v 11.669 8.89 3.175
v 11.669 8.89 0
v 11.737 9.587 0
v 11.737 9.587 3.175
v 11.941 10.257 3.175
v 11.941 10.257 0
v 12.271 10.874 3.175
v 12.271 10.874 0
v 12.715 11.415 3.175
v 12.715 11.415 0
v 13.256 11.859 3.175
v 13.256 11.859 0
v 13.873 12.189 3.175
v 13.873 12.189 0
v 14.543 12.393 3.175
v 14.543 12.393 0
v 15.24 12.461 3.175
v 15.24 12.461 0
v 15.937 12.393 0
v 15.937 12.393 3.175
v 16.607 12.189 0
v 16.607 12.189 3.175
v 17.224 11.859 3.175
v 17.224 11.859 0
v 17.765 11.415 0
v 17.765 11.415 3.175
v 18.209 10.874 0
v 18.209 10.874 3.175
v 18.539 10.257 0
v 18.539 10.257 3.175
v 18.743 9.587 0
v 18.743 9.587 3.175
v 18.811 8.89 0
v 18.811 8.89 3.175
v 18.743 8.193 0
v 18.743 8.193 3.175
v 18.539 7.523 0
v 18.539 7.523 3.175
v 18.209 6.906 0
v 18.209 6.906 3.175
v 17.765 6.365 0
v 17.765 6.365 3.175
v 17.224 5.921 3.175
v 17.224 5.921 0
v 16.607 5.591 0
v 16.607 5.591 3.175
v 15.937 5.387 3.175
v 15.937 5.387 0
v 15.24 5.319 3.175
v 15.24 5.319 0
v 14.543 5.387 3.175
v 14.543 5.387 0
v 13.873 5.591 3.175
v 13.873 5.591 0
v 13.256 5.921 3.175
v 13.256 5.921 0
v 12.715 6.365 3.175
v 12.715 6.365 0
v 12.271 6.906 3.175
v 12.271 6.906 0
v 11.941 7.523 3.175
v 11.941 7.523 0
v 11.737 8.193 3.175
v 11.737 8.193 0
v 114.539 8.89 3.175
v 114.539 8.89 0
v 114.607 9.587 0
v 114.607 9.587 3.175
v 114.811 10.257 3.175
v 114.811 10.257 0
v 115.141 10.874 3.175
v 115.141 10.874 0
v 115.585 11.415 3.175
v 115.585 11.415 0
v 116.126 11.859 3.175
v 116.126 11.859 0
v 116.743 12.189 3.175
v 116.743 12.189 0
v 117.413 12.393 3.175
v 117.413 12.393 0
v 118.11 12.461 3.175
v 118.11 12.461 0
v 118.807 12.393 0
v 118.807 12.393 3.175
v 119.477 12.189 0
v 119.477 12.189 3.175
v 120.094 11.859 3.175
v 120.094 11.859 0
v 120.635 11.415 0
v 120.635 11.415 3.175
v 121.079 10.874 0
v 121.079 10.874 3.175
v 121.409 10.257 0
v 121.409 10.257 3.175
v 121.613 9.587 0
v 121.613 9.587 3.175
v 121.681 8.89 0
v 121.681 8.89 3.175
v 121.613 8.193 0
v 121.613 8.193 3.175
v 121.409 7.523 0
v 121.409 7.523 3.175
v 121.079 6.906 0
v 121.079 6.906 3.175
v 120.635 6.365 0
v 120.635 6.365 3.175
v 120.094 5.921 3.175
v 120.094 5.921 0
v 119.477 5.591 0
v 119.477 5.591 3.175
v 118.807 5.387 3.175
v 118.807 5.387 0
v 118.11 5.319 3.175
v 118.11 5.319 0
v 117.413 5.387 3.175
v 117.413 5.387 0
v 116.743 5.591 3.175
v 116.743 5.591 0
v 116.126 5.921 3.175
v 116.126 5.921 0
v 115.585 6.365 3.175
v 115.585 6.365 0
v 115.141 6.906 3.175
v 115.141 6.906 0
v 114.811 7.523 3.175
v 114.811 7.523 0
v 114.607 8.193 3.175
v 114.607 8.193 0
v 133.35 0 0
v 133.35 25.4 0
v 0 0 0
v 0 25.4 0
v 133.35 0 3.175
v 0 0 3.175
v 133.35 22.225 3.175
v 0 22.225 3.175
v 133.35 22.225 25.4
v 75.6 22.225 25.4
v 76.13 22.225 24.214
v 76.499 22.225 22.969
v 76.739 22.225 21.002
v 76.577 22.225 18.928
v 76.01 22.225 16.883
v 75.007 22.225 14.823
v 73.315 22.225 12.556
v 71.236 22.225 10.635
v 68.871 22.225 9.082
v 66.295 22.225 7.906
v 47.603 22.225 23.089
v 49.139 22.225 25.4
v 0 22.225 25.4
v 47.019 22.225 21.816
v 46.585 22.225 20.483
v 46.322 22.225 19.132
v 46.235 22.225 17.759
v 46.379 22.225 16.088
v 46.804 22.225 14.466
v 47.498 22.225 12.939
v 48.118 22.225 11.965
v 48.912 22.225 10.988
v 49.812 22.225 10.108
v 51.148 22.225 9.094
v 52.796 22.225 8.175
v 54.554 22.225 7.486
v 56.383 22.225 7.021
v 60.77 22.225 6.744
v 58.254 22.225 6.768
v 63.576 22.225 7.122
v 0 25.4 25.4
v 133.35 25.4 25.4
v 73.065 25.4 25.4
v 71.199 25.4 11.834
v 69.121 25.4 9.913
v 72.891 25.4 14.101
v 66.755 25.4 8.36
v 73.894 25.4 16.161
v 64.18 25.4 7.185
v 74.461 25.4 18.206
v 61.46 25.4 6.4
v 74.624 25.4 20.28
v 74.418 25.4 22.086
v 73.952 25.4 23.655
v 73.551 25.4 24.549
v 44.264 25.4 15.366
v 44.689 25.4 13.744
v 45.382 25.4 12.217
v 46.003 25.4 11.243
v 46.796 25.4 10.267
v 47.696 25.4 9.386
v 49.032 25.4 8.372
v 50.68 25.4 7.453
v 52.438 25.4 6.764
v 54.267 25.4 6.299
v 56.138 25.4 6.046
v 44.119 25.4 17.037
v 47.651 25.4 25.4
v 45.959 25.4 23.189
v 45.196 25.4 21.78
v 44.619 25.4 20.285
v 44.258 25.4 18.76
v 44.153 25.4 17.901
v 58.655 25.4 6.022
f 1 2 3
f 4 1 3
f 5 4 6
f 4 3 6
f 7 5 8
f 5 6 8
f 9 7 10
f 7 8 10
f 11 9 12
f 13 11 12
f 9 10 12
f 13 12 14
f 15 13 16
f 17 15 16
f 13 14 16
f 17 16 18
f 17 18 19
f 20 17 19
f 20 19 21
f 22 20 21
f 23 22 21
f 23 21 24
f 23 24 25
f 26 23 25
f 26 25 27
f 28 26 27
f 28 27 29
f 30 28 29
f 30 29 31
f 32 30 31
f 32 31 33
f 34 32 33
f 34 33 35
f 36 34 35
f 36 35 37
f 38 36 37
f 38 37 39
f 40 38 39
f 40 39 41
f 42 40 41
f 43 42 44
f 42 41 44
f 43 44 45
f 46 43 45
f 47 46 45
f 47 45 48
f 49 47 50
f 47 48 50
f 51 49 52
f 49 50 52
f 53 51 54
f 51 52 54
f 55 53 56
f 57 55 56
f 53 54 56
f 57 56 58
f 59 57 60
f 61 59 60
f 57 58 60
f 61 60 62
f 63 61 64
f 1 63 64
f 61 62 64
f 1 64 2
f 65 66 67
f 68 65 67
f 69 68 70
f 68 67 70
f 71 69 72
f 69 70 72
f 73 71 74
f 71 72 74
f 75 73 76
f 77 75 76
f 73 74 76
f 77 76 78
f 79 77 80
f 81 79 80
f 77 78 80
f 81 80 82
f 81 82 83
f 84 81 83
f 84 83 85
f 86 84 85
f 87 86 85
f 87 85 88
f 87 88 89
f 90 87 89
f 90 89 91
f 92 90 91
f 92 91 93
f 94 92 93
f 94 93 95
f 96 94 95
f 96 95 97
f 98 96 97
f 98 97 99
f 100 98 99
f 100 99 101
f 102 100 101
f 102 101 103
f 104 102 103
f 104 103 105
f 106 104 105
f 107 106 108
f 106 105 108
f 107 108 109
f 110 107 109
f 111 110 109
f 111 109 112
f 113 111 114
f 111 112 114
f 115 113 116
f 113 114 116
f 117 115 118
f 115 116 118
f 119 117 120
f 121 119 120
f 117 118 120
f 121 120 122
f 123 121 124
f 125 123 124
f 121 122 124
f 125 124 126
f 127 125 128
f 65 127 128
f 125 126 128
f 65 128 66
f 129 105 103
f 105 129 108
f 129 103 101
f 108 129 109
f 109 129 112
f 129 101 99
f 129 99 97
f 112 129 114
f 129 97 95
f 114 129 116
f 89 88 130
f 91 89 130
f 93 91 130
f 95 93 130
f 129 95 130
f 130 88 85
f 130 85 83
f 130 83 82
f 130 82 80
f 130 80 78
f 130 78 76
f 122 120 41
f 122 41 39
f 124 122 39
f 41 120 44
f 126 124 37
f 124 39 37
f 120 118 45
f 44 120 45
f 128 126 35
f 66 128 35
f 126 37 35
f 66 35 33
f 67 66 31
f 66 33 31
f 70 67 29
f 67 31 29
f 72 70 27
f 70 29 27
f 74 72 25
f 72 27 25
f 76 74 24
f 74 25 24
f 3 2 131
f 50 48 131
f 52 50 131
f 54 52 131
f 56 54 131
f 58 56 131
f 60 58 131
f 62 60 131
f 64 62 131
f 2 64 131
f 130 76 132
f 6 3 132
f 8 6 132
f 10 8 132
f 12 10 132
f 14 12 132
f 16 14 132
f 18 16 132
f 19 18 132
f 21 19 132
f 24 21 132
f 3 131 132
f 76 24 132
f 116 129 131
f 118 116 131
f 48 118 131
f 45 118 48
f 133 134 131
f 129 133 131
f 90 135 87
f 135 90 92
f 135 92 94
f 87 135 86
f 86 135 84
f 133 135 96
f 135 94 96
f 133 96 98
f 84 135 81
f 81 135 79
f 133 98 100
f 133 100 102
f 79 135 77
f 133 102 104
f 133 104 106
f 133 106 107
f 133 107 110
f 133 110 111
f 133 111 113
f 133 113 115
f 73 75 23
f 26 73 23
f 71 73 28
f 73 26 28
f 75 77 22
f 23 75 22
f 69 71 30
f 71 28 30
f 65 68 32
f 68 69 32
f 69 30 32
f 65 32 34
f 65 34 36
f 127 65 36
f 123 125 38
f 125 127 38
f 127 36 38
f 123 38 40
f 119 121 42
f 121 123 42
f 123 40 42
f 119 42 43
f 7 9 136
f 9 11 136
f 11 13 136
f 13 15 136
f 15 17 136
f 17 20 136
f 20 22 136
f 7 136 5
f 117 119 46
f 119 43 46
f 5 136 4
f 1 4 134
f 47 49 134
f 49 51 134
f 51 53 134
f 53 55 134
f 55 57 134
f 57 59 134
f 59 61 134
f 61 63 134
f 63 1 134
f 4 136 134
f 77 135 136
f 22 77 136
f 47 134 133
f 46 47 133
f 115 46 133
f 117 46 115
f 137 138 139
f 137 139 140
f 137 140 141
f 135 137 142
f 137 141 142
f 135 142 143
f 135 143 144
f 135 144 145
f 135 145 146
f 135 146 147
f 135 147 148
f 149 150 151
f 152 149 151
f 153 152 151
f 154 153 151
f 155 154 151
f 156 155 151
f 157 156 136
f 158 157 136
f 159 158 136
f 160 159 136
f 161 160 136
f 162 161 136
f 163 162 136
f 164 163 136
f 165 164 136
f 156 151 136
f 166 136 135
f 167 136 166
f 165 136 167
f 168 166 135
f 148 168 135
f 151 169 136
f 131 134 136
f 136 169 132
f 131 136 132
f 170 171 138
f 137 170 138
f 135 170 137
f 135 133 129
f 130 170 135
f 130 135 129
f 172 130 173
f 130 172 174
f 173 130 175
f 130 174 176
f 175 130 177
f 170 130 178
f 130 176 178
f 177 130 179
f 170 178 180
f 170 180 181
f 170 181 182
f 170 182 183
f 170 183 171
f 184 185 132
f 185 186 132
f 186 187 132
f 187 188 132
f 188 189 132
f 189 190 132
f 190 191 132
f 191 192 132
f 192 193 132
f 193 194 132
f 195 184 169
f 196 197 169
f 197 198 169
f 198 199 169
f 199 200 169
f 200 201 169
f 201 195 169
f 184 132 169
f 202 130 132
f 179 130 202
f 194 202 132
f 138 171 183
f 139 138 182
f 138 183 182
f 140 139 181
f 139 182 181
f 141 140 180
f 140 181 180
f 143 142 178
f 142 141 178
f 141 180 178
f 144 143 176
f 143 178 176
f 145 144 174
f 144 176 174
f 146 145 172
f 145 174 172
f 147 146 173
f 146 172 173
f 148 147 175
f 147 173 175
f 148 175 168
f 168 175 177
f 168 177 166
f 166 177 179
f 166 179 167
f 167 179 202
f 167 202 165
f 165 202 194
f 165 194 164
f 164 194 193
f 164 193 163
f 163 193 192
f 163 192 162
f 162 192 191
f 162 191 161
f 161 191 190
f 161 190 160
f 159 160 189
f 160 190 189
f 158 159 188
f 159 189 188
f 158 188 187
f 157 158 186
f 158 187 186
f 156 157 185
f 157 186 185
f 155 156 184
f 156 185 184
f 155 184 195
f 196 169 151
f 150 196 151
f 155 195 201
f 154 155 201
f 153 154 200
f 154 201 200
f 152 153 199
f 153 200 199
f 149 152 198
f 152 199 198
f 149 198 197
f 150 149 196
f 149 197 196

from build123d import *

# Parameters (mm, degrees)
BOSS_EXTRUDE1_DEPTH = 133.35
SKETCH5_R           = 3.57124
CUT_EXTRUDE1_DEPTH  = 139.103376269


with BuildPart() as part:
    # Sketch1 → Boss-Extrude1 (new body)
    with BuildSketch(Plane(origin=(0, 0, 0), x_dir=(0, 0, -1), z_dir=(1, 0, 0))):
        Polygon((0, 0), (0, 25.4), (-25.4, 25.4), (-25.4, 22.225), (-3.175, 22.225), (-3.175, 0), align=None)
    extrude(amount=BOSS_EXTRUDE1_DEPTH)

    # Cut-Sweep1: read off the stored shape, not the designer's step
    # Cut-Sweep1: loft between two sections, ruled curve by curve
    cut_sweep1_from = [
        Edge.make_bspline([(317.515141944, -384.873460742, 110.314894304), (318.529967826, -386.50832307, 135.641902686), (340.110332702, -373.112508356, 135.641902686), (339.095506819, -371.477646028, 110.314894304), (338.080680937, -369.8427837, 84.987885922), (316.500316061, -383.238598413, 84.987885922), (317.515141944, -384.873460742, 110.314894304)], [0, 0, 0, 0, 0.5, 0.5, 0.5, 1, 1, 1, 1], 3, [1, 0.333333333, 0.333333333, 1, 0.333333333, 0.333333333, 1]),
    ]
    cut_sweep1_to = [
        Edge.make_bspline([(-268.15000351, 494.008408115, -89.503953221), (-267.135177627, 492.373545787, -64.176944839), (-245.554812752, 505.769360501, -64.176944839), (-246.569638634, 507.404222829, -89.503953221), (-247.584464517, 509.039085157, -114.830961603), (-269.164829392, 495.643270444, -114.830961603), (-268.15000351, 494.008408115, -89.503953221)], [0, 0, 0, 0, 0.5, 0.5, 0.5, 1, 1, 1, 1], 3, [1, 0.333333333, 0.333333333, 1, 0.333333333, 0.333333333, 1]),
    ]
    cut_sweep1 = Solid(Shell([*[Face.make_surface_from_curves(cut_sweep1_from[k], cut_sweep1_to[k]) for k in range(1)], Face(Wire(cut_sweep1_from)), Face(Wire(cut_sweep1_to))]))
    add(cut_sweep1, mode=Mode.SUBTRACT)

    # Sketch5 → Cut-Extrude1 (cut, through all)
    with BuildSketch(Plane(origin=(0, 0, 0), x_dir=(-1, 0, 0), z_dir=(0, 0, -1))):
        with Locations((-118.11, 8.89)):
            Circle(SKETCH5_R)
        with Locations((-15.24, 8.89)):
            Circle(SKETCH5_R)
    extrude(amount=-CUT_EXTRUDE1_DEPTH, mode=Mode.SUBTRACT)


solid = part.part
